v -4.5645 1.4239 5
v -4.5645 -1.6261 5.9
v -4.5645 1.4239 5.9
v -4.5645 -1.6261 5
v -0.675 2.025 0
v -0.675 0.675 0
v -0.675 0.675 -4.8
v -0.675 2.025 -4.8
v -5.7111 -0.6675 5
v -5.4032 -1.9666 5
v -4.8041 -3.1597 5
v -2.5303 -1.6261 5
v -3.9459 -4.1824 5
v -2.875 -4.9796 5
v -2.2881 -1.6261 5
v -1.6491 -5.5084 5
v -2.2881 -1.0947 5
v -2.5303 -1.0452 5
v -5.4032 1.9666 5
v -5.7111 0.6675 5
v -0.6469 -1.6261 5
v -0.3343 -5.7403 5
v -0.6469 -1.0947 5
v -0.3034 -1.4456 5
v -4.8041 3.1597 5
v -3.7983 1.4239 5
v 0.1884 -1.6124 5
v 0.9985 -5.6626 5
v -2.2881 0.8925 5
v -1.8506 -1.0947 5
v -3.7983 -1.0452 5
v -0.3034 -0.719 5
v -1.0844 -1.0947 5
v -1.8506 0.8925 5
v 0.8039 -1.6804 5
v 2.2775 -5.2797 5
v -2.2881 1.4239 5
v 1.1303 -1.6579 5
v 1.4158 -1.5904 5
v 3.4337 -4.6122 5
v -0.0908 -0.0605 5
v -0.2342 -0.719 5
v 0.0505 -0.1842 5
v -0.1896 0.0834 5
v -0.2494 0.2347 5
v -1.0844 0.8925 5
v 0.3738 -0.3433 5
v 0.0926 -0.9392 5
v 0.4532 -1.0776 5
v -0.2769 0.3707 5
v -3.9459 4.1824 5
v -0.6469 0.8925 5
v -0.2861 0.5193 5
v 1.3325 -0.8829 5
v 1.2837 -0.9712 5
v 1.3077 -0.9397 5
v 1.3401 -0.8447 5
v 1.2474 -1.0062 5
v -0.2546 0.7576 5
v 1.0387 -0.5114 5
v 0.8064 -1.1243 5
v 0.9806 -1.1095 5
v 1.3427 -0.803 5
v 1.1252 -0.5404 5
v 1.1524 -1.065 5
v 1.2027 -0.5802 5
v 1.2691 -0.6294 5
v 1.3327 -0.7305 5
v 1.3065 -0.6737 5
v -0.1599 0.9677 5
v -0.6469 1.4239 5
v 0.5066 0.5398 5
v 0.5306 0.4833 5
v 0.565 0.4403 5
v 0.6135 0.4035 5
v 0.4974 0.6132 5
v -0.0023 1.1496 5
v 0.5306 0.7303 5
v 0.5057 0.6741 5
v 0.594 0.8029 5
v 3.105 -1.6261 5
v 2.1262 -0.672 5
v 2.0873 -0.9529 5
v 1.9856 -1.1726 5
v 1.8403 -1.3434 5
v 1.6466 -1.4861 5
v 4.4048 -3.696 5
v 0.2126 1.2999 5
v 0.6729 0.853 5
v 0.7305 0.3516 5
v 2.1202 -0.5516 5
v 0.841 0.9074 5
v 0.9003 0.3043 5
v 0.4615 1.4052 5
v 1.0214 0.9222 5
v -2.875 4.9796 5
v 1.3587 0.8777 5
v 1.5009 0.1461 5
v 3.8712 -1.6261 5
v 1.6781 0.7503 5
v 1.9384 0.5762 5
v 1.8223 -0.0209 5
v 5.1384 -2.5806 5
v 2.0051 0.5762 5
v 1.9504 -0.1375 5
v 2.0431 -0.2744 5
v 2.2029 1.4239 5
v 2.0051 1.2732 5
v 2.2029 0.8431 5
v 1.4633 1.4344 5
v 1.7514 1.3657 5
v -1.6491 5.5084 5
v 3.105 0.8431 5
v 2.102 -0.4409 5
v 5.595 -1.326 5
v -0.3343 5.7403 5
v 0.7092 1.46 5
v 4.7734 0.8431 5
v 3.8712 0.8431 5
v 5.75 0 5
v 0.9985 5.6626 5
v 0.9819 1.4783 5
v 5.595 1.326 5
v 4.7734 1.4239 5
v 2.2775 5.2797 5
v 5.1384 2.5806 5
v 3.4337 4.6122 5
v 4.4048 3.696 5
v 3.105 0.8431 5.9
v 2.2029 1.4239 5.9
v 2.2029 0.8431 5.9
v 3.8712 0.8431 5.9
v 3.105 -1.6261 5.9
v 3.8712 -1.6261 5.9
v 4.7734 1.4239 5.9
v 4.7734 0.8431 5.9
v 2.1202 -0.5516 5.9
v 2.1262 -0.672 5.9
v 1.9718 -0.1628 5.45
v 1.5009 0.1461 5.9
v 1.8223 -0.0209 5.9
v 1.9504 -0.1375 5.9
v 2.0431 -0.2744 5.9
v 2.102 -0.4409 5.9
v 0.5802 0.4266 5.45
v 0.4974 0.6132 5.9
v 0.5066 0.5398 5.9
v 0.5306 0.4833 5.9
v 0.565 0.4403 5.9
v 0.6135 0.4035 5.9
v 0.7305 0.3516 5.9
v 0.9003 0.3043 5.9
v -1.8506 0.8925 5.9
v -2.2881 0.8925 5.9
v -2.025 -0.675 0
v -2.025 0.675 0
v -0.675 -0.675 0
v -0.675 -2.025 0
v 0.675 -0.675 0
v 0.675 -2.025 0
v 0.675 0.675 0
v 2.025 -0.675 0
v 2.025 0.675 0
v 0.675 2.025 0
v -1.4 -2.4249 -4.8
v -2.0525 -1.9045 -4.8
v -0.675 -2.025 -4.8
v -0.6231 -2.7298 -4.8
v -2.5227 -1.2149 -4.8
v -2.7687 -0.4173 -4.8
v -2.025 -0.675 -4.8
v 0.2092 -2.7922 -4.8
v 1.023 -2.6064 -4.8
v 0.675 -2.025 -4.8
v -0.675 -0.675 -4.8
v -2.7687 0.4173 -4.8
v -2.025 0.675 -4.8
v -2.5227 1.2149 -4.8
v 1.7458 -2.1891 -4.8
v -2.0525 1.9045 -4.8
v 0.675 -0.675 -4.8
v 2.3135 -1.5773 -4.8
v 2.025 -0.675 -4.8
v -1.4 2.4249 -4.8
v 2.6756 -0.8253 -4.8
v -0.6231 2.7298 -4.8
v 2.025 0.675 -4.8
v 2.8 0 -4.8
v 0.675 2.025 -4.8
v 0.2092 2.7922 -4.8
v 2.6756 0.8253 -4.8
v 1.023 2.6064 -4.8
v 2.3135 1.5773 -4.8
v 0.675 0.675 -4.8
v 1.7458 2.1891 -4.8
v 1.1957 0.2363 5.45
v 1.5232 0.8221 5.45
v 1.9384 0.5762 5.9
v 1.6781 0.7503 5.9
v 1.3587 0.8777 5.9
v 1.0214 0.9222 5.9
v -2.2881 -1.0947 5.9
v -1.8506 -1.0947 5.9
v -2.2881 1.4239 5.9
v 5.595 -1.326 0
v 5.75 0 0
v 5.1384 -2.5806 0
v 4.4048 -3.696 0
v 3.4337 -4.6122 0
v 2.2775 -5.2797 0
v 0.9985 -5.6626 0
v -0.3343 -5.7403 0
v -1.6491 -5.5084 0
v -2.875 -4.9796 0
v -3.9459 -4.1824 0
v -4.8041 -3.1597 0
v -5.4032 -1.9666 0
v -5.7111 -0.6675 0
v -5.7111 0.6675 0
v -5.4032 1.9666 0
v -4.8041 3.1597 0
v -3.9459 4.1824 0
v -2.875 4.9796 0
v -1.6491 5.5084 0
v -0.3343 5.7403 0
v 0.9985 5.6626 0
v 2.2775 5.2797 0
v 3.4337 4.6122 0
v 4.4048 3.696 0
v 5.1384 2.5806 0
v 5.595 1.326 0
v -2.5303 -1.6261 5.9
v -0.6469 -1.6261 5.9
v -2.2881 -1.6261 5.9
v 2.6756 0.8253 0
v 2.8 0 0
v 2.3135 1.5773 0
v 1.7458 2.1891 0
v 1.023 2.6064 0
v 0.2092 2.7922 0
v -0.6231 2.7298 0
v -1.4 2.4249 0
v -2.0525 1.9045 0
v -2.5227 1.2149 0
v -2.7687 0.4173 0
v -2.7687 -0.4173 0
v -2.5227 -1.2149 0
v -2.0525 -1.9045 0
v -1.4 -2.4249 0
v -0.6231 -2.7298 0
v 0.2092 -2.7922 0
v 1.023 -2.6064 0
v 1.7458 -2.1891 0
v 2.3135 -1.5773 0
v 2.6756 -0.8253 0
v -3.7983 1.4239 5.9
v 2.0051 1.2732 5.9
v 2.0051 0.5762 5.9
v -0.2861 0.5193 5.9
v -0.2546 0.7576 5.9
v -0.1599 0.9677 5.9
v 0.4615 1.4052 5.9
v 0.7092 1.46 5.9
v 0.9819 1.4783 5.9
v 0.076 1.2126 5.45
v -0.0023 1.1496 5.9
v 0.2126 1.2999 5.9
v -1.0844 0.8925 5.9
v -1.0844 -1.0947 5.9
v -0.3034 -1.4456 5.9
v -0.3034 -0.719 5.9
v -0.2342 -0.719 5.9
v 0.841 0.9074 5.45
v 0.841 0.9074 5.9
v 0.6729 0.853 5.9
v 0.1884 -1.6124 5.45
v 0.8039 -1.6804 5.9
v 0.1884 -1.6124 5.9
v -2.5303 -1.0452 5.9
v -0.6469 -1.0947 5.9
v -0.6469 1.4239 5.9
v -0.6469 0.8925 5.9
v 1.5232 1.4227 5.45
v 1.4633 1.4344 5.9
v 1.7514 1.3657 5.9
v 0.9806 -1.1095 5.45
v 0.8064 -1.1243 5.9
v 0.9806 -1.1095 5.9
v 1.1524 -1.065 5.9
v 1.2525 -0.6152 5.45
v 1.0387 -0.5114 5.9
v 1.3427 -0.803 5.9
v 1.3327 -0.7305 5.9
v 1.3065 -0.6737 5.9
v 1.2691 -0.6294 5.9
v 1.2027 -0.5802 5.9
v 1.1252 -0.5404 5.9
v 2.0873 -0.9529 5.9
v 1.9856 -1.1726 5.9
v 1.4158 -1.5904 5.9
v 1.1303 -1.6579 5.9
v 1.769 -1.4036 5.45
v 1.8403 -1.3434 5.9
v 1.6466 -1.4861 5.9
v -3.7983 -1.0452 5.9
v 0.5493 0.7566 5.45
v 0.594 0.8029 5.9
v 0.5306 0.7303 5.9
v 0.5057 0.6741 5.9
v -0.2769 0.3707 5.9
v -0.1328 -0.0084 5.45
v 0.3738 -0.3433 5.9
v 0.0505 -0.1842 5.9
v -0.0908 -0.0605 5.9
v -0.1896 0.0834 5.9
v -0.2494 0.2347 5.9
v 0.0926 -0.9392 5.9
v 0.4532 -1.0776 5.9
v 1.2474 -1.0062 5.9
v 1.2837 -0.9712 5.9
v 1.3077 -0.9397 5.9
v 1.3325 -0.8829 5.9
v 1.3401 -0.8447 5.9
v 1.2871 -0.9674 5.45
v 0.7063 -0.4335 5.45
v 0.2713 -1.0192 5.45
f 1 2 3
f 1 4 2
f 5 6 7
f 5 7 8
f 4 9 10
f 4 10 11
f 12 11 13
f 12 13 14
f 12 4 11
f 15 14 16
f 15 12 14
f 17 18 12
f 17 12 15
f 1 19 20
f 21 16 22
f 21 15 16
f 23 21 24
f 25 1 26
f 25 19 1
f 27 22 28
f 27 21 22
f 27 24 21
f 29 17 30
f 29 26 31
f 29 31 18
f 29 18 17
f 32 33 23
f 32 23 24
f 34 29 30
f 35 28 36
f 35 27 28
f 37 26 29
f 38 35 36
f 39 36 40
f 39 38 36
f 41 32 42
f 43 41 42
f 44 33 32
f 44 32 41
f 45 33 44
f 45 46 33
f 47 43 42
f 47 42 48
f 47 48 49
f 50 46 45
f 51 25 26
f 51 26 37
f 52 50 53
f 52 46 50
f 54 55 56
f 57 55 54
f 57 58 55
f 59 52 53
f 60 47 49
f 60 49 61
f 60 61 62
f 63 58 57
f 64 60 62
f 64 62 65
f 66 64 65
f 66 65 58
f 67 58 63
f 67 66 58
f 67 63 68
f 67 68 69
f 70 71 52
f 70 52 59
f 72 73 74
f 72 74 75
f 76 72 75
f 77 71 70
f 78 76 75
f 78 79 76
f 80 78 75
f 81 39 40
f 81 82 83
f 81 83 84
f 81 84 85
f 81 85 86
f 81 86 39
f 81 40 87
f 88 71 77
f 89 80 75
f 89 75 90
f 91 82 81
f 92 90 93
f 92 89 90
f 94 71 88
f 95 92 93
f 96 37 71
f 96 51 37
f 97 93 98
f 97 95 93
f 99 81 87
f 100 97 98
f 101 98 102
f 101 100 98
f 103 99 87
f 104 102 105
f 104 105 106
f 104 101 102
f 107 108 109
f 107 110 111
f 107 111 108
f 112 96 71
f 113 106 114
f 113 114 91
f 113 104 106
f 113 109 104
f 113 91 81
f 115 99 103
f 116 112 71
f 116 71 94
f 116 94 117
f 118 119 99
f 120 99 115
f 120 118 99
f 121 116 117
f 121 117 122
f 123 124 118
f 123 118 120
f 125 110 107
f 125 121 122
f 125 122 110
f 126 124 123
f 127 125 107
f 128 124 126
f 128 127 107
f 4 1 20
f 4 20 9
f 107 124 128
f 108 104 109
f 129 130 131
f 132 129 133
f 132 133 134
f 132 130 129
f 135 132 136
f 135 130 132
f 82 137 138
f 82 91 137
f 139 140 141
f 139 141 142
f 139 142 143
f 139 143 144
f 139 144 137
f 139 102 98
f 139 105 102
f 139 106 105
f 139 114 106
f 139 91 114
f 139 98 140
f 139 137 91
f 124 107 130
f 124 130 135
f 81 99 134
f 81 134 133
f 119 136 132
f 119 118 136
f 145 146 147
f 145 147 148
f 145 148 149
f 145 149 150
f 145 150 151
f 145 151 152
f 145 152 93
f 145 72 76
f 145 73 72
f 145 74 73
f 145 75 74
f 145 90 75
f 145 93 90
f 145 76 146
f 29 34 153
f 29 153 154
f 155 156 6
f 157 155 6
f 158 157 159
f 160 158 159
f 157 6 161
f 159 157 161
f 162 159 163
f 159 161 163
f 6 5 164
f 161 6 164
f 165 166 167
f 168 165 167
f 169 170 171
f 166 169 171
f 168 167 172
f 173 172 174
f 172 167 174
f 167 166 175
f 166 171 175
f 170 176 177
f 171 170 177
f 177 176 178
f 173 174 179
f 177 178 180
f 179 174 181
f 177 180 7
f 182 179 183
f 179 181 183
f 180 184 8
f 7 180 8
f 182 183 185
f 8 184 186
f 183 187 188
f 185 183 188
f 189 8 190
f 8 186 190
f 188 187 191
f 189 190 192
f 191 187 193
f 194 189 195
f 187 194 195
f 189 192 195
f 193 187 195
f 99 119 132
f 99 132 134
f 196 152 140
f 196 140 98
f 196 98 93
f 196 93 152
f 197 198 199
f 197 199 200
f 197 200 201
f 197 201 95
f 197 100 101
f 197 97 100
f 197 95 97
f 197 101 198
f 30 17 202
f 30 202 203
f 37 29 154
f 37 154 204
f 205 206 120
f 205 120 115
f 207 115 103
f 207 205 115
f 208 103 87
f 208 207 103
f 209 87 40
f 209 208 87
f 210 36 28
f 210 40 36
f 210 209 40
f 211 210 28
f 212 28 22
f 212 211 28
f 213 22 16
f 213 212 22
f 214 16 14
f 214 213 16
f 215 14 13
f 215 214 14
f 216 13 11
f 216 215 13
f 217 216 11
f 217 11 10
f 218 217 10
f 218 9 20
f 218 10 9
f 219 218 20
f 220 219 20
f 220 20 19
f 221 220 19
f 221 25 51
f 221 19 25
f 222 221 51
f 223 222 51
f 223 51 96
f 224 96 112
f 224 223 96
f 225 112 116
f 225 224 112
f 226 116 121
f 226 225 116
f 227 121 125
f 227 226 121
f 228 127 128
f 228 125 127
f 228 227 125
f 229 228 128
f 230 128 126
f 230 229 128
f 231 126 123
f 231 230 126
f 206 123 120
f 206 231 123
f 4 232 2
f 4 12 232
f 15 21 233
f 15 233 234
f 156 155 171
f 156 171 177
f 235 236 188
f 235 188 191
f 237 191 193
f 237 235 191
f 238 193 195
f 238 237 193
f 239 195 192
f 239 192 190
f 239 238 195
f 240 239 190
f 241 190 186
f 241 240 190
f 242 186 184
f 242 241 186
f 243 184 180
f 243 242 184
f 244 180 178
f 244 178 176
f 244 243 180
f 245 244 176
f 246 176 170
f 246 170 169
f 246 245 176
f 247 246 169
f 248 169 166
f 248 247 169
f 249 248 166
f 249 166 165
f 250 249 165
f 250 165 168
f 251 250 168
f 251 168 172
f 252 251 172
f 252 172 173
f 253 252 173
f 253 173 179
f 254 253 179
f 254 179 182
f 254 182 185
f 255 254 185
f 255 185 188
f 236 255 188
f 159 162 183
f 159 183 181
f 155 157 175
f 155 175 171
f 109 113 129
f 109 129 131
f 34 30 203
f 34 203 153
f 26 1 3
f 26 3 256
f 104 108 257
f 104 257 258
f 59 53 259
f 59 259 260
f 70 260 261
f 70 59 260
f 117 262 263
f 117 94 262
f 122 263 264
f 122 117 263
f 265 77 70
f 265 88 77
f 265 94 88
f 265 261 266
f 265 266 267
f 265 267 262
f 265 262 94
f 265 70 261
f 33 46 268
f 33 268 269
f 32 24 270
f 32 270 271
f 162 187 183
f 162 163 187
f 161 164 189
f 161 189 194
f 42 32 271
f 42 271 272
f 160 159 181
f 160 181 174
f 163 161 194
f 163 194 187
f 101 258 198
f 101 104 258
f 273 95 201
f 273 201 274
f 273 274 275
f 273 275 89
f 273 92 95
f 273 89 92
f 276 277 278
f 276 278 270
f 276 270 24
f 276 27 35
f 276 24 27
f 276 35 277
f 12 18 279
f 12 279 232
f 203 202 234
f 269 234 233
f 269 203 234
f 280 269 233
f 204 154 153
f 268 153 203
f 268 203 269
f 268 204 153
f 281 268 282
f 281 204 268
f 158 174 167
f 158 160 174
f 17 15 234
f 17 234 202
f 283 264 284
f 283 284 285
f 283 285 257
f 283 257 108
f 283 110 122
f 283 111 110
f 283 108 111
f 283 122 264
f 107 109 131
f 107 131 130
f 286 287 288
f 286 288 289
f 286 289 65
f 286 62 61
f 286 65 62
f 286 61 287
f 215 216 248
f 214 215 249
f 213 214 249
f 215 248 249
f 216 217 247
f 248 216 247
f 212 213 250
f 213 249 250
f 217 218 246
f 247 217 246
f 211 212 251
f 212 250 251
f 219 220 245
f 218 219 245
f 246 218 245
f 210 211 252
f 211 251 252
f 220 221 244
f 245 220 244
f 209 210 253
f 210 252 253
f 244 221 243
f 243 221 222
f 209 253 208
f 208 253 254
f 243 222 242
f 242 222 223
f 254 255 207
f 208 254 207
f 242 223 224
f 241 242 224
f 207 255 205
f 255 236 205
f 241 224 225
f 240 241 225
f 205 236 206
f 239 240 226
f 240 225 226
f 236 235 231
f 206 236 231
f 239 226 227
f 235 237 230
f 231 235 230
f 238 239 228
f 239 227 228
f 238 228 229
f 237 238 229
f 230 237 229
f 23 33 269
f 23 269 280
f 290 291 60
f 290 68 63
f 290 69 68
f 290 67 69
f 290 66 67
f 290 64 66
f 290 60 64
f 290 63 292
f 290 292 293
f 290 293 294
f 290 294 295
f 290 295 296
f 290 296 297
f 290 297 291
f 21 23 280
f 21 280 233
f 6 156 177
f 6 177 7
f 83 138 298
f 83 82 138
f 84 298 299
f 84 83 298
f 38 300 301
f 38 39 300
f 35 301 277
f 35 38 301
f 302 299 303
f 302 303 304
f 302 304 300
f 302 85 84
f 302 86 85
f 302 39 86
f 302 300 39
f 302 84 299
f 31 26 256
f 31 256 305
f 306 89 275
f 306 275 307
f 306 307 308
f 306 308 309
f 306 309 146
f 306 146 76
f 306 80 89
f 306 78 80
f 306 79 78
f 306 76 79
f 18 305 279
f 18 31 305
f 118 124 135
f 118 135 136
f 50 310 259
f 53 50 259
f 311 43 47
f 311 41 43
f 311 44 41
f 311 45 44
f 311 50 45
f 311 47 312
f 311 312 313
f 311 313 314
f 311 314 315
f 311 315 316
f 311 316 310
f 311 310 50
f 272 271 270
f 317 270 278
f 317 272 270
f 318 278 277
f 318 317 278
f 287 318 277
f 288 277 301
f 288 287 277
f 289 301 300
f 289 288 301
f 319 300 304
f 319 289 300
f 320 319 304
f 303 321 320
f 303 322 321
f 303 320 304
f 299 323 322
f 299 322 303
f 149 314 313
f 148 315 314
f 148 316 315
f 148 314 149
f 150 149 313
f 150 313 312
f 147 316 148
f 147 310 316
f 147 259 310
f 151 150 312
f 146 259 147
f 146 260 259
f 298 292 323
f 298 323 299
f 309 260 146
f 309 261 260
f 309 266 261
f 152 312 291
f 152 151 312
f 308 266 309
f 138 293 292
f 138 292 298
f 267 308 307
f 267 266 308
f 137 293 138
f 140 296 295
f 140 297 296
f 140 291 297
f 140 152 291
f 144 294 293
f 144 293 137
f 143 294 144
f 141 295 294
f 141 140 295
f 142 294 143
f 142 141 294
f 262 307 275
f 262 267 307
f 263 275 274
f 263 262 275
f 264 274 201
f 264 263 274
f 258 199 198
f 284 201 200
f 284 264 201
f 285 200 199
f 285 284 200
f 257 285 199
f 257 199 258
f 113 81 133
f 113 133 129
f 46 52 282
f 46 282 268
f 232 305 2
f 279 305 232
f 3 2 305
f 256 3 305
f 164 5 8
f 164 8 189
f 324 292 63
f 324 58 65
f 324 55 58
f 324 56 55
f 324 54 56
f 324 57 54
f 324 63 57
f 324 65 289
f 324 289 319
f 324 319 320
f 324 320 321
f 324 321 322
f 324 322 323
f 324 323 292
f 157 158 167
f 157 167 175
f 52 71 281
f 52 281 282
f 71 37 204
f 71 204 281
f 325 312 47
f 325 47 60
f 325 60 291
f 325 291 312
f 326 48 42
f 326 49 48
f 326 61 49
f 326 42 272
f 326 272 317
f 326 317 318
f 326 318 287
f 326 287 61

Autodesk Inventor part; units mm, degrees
ref_plane "YZ Plane" through (0, 0, 0) normal (1, 0, 0) x (0, 1, 0)
ref_plane "XZ Plane" through (0, 0, 0) normal (0, 1, 0) x (-1, 0, 0)
ref_plane "XY Plane" through (0, 0, 0) normal (0, 0, 1) x (1, 0, 0)
sketch "Sketch1" plane through (0, 0, 0) normal (0, 0, 1) x (1, 0, 0)
  circle A0 centre (0, 0) radius 6.22 construction
  circle A1 centre (0, 0) radius 2.8
  line L0 (-0.675, 0.675) -> (-0.675, 2.025)
  line L1 (-0.675, 2.025) -> (0.675, 2.025)
  line L2 (0.675, 2.025) -> (0.675, 0.675)
  line L3 (0.675, 0.675) -> (2.025, 0.675)
  line L4 (2.025, 0.675) -> (2.025, -0.675)
  line L5 (2.025, -0.675) -> (0.675, -0.675)
  line L6 (0.675, -0.675) -> (0.675, -2.025)
  line L7 (0.675, -2.025) -> (-0.675, -2.025)
  line L8 (-0.675, -2.025) -> (-0.675, -0.675)
  line L9 (-0.675, -0.675) -> (-2.025, -0.675)
  line L10 (-2.025, -0.675) -> (-2.025, 0.675)
  line L11 (-2.025, 0.675) -> (-0.675, 0.675)
  circle A2 centre (0, 0) radius 5.75
  point P0 (-6.07, -6.1)
  dimension "d0" = 12.44
  dimension "d1" = 0.47
extrude "Extrusion1" add sketch "Sketch1" along normal blind 5 contours A1 | L0 L1 L2 L3 L4 L5 L6 L7 L8 L9 L10 L11 | A2
extrude "Extrusion2" add sketch "Sketch1" against normal blind 4.8 contours A1
sketch "Sketch2" plane through (0, 0, 5) normal (0, 0, 1) x (1, 0, 0)
  point P0 (0, 0)
sketch "Sketch3" plane through (0, 0, 5) normal (0, 0, 1) x (1, 0, 0)
  line L0 (-4.8809, 1.4783) -> (4.8809, 1.4783) construction
  line L1 (4.8809, 1.4783) -> (4.8809, -1.6654) construction
  line L2 (4.8809, -1.6654) -> (-4.8809, -1.6654) construction
  line L3 (-4.8809, -1.6654) -> (-4.8809, 1.4783) construction
  line L4 (-2.5303, -1.6261) -> (-4.5645, -1.6261)
  line L5 (-4.5645, -1.6261) -> (-4.5645, 1.4239)
  line L6 (-4.5645, 1.4239) -> (-3.7983, 1.4239)
  line L7 (-3.7983, 1.4239) -> (-3.7983, -1.0452)
  line L8 (-3.7983, -1.0452) -> (-2.5303, -1.0452)
  line L9 (-2.5303, -1.0452) -> (-2.5303, -1.6261)
  line L10 (-0.6469, -1.6261) -> (-2.2881, -1.6261)
  line L11 (-2.2881, -1.6261) -> (-2.2881, -1.0947)
  line L12 (-2.2881, -1.0947) -> (-1.8506, -1.0947)
  line L13 (-1.8506, -1.0947) -> (-1.8506, 0.8925)
  line L14 (-1.8506, 0.8925) -> (-2.2881, 0.8925)
  line L15 (-2.2881, 0.8925) -> (-2.2881, 1.4239)
  line L16 (-2.2881, 1.4239) -> (-0.6469, 1.4239)
  line L17 (-0.6469, 1.4239) -> (-0.6469, 0.8925)
  line L18 (-0.6469, 0.8925) -> (-1.0844, 0.8925)
  line L19 (-1.0844, 0.8925) -> (-1.0844, -1.0947)
  line L20 (-1.0844, -1.0947) -> (-0.6469, -1.0947)
  line L21 (-0.6469, -1.0947) -> (-0.6469, -1.6261)
  spline S0 degree 2 poles (0.8039, -1.6804) (0.4529, -1.6804) (-0.076, -1.5445) (-0.3034, -1.4456) knots 0 0 0 1 2 2 2
  line L22 (-0.3034, -1.4456) -> (-0.3034, -0.719)
  line L23 (-0.3034, -0.719) -> (-0.2342, -0.719)
  spline S1 degree 2 poles (-0.2342, -0.719) (-0.0043, -0.9142) (0.5469, -1.1243) (0.8064, -1.1243) knots 0 0 0 1 2 2 2
  spline S2 degree 2 poles (0.8064, -1.1243) (0.8731, -1.1243) (1.0882, -1.0947) (1.1524, -1.065) knots 0 0 0 1 2 2 2
  spline S3 degree 2 poles (1.1524, -1.065) (1.2315, -1.0304) (1.3427, -0.9044) (1.3427, -0.803) knots 0 0 0 1 2 2 2
  spline S4 degree 2 poles (1.3427, -0.803) (1.3427, -0.6868) (1.1623, -0.5435) (1.0387, -0.5114) knots 0 0 0 1 2 2 2
  spline S5 degree 2 poles (1.0387, -0.5114) (0.883, -0.4693) (0.5296, -0.3977) (0.3738, -0.3433) knots 0 0 0 1 2 2 2
  spline S6 degree 2 poles (0.3738, -0.3433) (0.0204, -0.2197) (-0.2861, 0.2029) (-0.2861, 0.5193) knots 0 0 0 1 2 2 2
  spline S7 degree 2 poles (-0.2861, 0.5193) (-0.2861, 0.9469) (0.4381, 1.4783) (0.9819, 1.4783) knots 0 0 0 1 2 2 2
  spline S8 degree 2 poles (0.9819, 1.4783) (1.2538, 1.4783) (1.7926, 1.3671) (2.0051, 1.2732) knots 0 0 0 1 2 2 2
  line L24 (2.0051, 1.2732) -> (2.0051, 0.5762)
  line L25 (2.0051, 0.5762) -> (1.9384, 0.5762)
  spline S9 degree 2 poles (1.9384, 0.5762) (1.7679, 0.722) (1.2785, 0.9222) (1.0214, 0.9222) knots 0 0 0 1 2 2 2
  spline S10 degree 2 poles (1.0214, 0.9222) (0.9201, 0.9222) (0.7619, 0.8925) (0.6729, 0.853) knots 0 0 0 1 2 2 2
  spline S11 degree 2 poles (0.6729, 0.853) (0.6012, 0.8209) (0.4974, 0.6923) (0.4974, 0.6132) knots 0 0 0 1 2 2 2
  spline S12 degree 2 poles (0.4974, 0.6132) (0.4974, 0.4946) (0.663, 0.3587) (0.9003, 0.3043) knots 0 0 0 1 2 2 2
  spline S13 degree 2 poles (0.9003, 0.3043) (1.0535, 0.2697) (1.3378, 0.2029) (1.5009, 0.1461) knots 0 0 0 1 2 2 2
  spline S14 degree 2 poles (1.5009, 0.1461) (1.8173, 0.0299) (2.1262, -0.3556) (2.1262, -0.672) knots 0 0 0 1 2 2 2
  spline S15 degree 2 poles (2.1262, -0.672) (2.1262, -1.1268) (1.4119, -1.6804) (0.8039, -1.6804) knots 0 0 0 1 2 2 2
  line L26 (3.105, -1.6261) -> (3.105, 0.8431)
  line L27 (3.105, 0.8431) -> (2.2029, 0.8431)
  line L28 (2.2029, 0.8431) -> (2.2029, 1.4239)
  line L29 (2.2029, 1.4239) -> (4.7734, 1.4239)
  line L30 (4.7734, 1.4239) -> (4.7734, 0.8431)
  line L31 (4.7734, 0.8431) -> (3.8712, 0.8431)
  line L32 (3.8712, 0.8431) -> (3.8712, -1.6261)
  line L33 (3.8712, -1.6261) -> (3.105, -1.6261)
  point P0 (0, -1.6654)
  point P1 (0, 0)
  point P2 (0, 0)
extrude "Extrusion5" add sketch "Sketch3" along normal blind 0.9
properties part number "IPC List key"
